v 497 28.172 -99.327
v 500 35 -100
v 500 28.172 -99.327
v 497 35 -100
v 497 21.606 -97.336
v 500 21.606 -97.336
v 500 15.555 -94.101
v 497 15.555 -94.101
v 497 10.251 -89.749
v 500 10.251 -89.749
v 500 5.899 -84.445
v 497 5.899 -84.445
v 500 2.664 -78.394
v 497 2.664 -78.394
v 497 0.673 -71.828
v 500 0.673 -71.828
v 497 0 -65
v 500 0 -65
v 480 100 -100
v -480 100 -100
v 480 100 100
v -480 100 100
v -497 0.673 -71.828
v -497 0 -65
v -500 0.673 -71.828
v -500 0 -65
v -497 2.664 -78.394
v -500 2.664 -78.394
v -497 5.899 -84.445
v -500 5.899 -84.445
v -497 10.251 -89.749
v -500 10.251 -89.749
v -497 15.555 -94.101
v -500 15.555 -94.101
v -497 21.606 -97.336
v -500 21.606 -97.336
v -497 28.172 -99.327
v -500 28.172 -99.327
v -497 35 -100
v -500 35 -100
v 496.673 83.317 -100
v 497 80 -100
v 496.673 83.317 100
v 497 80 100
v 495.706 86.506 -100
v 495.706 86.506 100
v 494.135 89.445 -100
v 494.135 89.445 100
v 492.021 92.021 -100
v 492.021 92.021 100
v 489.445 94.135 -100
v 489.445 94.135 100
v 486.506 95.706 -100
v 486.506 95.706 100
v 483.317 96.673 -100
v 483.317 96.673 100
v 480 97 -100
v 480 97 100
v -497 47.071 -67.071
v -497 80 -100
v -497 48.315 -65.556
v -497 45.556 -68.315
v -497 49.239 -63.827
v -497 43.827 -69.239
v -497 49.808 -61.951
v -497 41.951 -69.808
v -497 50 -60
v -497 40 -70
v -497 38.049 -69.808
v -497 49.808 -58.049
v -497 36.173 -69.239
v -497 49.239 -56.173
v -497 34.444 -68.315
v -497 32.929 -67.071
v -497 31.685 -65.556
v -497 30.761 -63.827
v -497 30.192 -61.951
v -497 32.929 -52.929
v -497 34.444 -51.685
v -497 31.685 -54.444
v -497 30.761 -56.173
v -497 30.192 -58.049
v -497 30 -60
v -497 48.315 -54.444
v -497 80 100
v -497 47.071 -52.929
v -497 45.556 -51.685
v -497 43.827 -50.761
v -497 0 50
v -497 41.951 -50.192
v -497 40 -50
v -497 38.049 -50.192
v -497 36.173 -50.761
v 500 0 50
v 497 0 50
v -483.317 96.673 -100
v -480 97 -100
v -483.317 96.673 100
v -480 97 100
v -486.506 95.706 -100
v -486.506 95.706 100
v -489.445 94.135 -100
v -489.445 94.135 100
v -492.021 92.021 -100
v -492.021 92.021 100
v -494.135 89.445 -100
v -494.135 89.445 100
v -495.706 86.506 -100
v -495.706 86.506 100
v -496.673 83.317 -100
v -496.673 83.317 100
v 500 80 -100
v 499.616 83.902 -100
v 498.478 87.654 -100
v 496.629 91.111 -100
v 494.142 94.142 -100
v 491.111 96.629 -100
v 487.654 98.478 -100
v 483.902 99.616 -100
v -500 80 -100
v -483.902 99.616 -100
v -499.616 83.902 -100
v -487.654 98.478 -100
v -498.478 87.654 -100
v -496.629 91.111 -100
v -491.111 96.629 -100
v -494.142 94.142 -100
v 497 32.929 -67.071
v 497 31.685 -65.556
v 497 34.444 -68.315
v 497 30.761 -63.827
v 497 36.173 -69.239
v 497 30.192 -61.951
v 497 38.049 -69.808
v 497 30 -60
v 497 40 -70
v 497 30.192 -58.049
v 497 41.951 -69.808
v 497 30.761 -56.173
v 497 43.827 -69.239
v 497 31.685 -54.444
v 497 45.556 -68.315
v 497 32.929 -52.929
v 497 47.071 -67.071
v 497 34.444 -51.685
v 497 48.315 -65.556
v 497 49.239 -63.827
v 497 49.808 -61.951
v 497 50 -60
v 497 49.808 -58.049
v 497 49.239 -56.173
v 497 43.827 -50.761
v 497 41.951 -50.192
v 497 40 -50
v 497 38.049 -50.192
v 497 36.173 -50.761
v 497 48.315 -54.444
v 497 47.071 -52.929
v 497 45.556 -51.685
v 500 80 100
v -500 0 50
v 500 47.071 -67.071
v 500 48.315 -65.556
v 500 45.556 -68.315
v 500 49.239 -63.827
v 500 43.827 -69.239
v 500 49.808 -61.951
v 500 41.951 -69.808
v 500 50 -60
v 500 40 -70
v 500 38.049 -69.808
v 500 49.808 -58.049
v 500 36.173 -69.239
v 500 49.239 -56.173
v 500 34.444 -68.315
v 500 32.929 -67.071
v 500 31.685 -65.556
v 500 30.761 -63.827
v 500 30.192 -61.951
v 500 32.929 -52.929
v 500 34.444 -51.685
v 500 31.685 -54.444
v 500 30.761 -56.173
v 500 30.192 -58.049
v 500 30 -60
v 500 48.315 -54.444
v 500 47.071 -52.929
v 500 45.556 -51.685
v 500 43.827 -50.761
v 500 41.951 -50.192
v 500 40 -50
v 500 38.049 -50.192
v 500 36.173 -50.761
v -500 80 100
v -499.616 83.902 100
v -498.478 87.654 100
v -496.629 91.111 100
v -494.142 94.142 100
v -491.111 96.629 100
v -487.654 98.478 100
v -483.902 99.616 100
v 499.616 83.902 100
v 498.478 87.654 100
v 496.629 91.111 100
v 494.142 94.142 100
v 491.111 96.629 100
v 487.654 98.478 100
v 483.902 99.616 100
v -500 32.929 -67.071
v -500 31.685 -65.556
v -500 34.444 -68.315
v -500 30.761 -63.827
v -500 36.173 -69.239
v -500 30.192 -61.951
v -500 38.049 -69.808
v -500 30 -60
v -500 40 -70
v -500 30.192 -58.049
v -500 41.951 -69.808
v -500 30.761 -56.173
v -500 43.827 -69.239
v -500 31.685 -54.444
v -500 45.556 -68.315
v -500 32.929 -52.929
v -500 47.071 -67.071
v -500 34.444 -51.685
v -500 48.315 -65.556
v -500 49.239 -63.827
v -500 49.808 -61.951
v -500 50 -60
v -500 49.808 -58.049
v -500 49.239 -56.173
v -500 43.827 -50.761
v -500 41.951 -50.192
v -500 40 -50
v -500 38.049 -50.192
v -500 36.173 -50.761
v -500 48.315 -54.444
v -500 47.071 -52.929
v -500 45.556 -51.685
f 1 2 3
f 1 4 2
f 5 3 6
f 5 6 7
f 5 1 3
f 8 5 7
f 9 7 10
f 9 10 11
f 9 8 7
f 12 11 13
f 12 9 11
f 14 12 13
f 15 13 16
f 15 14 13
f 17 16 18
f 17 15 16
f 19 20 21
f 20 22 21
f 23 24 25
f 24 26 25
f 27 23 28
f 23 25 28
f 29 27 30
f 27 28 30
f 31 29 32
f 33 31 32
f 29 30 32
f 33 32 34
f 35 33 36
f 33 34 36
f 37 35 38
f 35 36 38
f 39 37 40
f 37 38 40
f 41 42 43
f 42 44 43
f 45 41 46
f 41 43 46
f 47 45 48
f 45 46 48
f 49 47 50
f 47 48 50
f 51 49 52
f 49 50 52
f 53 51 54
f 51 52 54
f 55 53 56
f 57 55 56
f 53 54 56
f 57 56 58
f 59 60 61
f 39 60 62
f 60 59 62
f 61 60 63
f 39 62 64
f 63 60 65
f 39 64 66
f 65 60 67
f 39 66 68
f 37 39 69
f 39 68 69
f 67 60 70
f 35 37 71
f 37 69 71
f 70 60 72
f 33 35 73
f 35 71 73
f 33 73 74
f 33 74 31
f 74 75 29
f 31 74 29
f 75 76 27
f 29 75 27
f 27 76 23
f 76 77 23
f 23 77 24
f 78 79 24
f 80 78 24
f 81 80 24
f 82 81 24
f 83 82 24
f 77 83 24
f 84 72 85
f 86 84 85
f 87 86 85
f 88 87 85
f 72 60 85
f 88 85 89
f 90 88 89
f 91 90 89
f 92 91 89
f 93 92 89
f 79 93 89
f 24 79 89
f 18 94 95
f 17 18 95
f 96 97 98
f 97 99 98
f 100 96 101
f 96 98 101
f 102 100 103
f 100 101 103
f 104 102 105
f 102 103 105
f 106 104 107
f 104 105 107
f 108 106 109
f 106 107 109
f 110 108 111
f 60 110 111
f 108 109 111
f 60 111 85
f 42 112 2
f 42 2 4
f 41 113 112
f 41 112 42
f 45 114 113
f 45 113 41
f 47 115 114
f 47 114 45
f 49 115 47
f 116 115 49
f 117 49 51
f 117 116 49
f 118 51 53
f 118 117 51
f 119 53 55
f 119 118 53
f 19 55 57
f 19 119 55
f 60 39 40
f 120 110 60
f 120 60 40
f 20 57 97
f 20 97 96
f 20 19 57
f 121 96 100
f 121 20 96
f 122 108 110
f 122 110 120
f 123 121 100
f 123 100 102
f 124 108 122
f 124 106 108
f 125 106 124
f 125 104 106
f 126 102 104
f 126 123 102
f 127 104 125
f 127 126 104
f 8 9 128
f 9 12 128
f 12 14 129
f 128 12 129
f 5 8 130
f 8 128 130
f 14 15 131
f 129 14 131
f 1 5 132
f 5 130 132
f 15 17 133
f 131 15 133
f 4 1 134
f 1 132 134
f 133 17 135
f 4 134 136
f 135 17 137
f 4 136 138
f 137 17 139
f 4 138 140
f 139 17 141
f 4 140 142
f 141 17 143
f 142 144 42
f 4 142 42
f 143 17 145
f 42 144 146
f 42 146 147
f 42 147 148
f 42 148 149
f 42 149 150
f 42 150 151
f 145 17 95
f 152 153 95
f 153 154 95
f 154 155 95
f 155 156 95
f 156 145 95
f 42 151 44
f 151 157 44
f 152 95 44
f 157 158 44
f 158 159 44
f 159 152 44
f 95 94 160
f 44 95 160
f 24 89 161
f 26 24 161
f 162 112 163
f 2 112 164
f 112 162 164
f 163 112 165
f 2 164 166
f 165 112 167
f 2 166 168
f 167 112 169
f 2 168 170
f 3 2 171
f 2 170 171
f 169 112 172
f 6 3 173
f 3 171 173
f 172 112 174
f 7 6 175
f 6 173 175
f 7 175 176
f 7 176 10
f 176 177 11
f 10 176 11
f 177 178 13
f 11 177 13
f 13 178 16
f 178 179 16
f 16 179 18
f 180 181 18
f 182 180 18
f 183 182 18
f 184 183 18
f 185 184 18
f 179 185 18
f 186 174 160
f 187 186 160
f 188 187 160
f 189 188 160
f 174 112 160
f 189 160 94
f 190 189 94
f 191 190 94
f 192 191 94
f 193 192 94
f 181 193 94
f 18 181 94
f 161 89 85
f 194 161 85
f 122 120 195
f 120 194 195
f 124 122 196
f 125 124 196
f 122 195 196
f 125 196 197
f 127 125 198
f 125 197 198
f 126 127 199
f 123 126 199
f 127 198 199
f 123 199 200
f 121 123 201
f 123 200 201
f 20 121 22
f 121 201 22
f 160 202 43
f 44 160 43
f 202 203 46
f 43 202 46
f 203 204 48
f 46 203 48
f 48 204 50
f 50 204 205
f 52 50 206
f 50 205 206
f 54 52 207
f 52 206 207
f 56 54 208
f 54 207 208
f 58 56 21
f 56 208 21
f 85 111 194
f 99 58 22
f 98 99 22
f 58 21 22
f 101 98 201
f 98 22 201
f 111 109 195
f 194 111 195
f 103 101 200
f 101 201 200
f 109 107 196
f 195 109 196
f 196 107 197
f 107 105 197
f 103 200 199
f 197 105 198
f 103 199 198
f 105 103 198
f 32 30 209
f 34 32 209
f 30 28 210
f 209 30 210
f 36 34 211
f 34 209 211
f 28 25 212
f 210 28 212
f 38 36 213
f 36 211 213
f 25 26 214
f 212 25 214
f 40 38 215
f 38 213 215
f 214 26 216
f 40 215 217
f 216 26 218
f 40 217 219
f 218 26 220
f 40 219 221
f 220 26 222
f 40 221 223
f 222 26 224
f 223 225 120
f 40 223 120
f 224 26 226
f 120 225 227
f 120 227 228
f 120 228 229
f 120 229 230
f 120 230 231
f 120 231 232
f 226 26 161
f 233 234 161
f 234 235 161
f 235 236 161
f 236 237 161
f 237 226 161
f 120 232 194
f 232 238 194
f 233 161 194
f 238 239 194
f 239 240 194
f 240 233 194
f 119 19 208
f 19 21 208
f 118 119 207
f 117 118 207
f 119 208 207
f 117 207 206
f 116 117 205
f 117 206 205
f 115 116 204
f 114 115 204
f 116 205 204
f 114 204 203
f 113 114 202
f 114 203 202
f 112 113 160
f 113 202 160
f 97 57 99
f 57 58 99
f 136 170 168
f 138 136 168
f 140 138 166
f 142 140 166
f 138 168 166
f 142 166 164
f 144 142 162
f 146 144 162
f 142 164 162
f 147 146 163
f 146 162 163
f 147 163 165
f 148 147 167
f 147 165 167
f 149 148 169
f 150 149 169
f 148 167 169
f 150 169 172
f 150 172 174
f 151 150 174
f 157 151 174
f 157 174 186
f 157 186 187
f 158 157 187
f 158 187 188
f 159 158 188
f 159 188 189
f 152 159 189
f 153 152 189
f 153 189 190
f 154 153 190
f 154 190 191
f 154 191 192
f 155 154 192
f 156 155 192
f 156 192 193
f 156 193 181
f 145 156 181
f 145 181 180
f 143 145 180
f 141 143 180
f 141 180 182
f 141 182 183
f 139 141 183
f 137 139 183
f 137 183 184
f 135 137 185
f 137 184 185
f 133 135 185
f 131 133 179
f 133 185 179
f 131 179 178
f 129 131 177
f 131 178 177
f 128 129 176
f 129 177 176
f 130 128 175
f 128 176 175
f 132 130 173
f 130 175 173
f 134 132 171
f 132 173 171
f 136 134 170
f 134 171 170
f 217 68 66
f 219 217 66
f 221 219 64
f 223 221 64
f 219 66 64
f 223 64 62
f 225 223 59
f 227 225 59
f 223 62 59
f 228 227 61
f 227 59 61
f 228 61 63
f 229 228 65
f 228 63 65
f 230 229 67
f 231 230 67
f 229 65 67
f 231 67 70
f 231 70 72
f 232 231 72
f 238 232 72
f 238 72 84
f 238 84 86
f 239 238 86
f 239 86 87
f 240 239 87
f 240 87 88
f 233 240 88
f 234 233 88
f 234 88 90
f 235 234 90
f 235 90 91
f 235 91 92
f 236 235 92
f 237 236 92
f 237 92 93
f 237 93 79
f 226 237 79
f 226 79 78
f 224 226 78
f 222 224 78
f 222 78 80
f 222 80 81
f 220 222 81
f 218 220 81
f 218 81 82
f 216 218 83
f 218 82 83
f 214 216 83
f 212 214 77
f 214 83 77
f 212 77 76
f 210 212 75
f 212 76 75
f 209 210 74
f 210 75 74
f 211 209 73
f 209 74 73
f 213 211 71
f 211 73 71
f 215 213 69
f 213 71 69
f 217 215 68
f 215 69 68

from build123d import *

# Parameters (mm, degrees)
BOSS_EXTRUDE1_DEPTH = 100
CUT_EXTRUDE1_DEPTH  = 1001
SKETCH3_R           = 10
CUT_EXTRUDE2_DEPTH  = 1001
FILLET1_R           = 35


with BuildPart() as part:
    # Sketch1 → Boss-Extrude1 (new body, symmetric)
    with BuildSketch(Plane.XY):
        with BuildLine():
            Line((-500, 0), (-500, 80))
            ThreePointArc((-500, 80), (-494.142135624, 94.142135624), (-480, 100))
            Line((-480, 100), (480, 100))
            ThreePointArc((480, 100), (494.142135624, 94.142135624), (500, 80))
            Line((500, 80), (500, 0))
            Line((500, 0), (497, 0))
            Line((497, 0), (497, 80))
            ThreePointArc((497, 80), (492.02081528, 92.02081528), (480, 97))
            Line((480, 97), (-480, 97))
            ThreePointArc((-480, 97), (-492.02081528, 92.02081528), (-497, 80))
            Line((-497, 80), (-497, 0))
            Line((-497, 0), (-500, 0))
        make_face()
    extrude(amount=BOSS_EXTRUDE1_DEPTH, both=True)

    # Sketch2 → Cut-Extrude1 (cut, through all)
    with BuildSketch(Plane(origin=(500, 0, 0), x_dir=(0, 0, -1), z_dir=(1, 0, 0))):
        Polygon((-100, 80), (-100, 0), (-50, 0), align=None)
    extrude(amount=-CUT_EXTRUDE1_DEPTH, mode=Mode.SUBTRACT)

    # Sketch3 → Cut-Extrude2 (cut, through all)
    with BuildSketch(Plane(origin=(500, 0, 0), x_dir=(0, 0, -1), z_dir=(1, 0, 0))):
        with Locations((60, 40)):
            Circle(SKETCH3_R)
    extrude(amount=-CUT_EXTRUDE2_DEPTH, mode=Mode.SUBTRACT)

    # Fillet1
    fillet1_edges = [part.edges().sort_by_distance(p)[0] for p in [
        (498.5, 0, -100),
        (-498.5, 0, -100),
    ]]
    fillet(fillet1_edges, radius=FILLET1_R)


solid = part.part
